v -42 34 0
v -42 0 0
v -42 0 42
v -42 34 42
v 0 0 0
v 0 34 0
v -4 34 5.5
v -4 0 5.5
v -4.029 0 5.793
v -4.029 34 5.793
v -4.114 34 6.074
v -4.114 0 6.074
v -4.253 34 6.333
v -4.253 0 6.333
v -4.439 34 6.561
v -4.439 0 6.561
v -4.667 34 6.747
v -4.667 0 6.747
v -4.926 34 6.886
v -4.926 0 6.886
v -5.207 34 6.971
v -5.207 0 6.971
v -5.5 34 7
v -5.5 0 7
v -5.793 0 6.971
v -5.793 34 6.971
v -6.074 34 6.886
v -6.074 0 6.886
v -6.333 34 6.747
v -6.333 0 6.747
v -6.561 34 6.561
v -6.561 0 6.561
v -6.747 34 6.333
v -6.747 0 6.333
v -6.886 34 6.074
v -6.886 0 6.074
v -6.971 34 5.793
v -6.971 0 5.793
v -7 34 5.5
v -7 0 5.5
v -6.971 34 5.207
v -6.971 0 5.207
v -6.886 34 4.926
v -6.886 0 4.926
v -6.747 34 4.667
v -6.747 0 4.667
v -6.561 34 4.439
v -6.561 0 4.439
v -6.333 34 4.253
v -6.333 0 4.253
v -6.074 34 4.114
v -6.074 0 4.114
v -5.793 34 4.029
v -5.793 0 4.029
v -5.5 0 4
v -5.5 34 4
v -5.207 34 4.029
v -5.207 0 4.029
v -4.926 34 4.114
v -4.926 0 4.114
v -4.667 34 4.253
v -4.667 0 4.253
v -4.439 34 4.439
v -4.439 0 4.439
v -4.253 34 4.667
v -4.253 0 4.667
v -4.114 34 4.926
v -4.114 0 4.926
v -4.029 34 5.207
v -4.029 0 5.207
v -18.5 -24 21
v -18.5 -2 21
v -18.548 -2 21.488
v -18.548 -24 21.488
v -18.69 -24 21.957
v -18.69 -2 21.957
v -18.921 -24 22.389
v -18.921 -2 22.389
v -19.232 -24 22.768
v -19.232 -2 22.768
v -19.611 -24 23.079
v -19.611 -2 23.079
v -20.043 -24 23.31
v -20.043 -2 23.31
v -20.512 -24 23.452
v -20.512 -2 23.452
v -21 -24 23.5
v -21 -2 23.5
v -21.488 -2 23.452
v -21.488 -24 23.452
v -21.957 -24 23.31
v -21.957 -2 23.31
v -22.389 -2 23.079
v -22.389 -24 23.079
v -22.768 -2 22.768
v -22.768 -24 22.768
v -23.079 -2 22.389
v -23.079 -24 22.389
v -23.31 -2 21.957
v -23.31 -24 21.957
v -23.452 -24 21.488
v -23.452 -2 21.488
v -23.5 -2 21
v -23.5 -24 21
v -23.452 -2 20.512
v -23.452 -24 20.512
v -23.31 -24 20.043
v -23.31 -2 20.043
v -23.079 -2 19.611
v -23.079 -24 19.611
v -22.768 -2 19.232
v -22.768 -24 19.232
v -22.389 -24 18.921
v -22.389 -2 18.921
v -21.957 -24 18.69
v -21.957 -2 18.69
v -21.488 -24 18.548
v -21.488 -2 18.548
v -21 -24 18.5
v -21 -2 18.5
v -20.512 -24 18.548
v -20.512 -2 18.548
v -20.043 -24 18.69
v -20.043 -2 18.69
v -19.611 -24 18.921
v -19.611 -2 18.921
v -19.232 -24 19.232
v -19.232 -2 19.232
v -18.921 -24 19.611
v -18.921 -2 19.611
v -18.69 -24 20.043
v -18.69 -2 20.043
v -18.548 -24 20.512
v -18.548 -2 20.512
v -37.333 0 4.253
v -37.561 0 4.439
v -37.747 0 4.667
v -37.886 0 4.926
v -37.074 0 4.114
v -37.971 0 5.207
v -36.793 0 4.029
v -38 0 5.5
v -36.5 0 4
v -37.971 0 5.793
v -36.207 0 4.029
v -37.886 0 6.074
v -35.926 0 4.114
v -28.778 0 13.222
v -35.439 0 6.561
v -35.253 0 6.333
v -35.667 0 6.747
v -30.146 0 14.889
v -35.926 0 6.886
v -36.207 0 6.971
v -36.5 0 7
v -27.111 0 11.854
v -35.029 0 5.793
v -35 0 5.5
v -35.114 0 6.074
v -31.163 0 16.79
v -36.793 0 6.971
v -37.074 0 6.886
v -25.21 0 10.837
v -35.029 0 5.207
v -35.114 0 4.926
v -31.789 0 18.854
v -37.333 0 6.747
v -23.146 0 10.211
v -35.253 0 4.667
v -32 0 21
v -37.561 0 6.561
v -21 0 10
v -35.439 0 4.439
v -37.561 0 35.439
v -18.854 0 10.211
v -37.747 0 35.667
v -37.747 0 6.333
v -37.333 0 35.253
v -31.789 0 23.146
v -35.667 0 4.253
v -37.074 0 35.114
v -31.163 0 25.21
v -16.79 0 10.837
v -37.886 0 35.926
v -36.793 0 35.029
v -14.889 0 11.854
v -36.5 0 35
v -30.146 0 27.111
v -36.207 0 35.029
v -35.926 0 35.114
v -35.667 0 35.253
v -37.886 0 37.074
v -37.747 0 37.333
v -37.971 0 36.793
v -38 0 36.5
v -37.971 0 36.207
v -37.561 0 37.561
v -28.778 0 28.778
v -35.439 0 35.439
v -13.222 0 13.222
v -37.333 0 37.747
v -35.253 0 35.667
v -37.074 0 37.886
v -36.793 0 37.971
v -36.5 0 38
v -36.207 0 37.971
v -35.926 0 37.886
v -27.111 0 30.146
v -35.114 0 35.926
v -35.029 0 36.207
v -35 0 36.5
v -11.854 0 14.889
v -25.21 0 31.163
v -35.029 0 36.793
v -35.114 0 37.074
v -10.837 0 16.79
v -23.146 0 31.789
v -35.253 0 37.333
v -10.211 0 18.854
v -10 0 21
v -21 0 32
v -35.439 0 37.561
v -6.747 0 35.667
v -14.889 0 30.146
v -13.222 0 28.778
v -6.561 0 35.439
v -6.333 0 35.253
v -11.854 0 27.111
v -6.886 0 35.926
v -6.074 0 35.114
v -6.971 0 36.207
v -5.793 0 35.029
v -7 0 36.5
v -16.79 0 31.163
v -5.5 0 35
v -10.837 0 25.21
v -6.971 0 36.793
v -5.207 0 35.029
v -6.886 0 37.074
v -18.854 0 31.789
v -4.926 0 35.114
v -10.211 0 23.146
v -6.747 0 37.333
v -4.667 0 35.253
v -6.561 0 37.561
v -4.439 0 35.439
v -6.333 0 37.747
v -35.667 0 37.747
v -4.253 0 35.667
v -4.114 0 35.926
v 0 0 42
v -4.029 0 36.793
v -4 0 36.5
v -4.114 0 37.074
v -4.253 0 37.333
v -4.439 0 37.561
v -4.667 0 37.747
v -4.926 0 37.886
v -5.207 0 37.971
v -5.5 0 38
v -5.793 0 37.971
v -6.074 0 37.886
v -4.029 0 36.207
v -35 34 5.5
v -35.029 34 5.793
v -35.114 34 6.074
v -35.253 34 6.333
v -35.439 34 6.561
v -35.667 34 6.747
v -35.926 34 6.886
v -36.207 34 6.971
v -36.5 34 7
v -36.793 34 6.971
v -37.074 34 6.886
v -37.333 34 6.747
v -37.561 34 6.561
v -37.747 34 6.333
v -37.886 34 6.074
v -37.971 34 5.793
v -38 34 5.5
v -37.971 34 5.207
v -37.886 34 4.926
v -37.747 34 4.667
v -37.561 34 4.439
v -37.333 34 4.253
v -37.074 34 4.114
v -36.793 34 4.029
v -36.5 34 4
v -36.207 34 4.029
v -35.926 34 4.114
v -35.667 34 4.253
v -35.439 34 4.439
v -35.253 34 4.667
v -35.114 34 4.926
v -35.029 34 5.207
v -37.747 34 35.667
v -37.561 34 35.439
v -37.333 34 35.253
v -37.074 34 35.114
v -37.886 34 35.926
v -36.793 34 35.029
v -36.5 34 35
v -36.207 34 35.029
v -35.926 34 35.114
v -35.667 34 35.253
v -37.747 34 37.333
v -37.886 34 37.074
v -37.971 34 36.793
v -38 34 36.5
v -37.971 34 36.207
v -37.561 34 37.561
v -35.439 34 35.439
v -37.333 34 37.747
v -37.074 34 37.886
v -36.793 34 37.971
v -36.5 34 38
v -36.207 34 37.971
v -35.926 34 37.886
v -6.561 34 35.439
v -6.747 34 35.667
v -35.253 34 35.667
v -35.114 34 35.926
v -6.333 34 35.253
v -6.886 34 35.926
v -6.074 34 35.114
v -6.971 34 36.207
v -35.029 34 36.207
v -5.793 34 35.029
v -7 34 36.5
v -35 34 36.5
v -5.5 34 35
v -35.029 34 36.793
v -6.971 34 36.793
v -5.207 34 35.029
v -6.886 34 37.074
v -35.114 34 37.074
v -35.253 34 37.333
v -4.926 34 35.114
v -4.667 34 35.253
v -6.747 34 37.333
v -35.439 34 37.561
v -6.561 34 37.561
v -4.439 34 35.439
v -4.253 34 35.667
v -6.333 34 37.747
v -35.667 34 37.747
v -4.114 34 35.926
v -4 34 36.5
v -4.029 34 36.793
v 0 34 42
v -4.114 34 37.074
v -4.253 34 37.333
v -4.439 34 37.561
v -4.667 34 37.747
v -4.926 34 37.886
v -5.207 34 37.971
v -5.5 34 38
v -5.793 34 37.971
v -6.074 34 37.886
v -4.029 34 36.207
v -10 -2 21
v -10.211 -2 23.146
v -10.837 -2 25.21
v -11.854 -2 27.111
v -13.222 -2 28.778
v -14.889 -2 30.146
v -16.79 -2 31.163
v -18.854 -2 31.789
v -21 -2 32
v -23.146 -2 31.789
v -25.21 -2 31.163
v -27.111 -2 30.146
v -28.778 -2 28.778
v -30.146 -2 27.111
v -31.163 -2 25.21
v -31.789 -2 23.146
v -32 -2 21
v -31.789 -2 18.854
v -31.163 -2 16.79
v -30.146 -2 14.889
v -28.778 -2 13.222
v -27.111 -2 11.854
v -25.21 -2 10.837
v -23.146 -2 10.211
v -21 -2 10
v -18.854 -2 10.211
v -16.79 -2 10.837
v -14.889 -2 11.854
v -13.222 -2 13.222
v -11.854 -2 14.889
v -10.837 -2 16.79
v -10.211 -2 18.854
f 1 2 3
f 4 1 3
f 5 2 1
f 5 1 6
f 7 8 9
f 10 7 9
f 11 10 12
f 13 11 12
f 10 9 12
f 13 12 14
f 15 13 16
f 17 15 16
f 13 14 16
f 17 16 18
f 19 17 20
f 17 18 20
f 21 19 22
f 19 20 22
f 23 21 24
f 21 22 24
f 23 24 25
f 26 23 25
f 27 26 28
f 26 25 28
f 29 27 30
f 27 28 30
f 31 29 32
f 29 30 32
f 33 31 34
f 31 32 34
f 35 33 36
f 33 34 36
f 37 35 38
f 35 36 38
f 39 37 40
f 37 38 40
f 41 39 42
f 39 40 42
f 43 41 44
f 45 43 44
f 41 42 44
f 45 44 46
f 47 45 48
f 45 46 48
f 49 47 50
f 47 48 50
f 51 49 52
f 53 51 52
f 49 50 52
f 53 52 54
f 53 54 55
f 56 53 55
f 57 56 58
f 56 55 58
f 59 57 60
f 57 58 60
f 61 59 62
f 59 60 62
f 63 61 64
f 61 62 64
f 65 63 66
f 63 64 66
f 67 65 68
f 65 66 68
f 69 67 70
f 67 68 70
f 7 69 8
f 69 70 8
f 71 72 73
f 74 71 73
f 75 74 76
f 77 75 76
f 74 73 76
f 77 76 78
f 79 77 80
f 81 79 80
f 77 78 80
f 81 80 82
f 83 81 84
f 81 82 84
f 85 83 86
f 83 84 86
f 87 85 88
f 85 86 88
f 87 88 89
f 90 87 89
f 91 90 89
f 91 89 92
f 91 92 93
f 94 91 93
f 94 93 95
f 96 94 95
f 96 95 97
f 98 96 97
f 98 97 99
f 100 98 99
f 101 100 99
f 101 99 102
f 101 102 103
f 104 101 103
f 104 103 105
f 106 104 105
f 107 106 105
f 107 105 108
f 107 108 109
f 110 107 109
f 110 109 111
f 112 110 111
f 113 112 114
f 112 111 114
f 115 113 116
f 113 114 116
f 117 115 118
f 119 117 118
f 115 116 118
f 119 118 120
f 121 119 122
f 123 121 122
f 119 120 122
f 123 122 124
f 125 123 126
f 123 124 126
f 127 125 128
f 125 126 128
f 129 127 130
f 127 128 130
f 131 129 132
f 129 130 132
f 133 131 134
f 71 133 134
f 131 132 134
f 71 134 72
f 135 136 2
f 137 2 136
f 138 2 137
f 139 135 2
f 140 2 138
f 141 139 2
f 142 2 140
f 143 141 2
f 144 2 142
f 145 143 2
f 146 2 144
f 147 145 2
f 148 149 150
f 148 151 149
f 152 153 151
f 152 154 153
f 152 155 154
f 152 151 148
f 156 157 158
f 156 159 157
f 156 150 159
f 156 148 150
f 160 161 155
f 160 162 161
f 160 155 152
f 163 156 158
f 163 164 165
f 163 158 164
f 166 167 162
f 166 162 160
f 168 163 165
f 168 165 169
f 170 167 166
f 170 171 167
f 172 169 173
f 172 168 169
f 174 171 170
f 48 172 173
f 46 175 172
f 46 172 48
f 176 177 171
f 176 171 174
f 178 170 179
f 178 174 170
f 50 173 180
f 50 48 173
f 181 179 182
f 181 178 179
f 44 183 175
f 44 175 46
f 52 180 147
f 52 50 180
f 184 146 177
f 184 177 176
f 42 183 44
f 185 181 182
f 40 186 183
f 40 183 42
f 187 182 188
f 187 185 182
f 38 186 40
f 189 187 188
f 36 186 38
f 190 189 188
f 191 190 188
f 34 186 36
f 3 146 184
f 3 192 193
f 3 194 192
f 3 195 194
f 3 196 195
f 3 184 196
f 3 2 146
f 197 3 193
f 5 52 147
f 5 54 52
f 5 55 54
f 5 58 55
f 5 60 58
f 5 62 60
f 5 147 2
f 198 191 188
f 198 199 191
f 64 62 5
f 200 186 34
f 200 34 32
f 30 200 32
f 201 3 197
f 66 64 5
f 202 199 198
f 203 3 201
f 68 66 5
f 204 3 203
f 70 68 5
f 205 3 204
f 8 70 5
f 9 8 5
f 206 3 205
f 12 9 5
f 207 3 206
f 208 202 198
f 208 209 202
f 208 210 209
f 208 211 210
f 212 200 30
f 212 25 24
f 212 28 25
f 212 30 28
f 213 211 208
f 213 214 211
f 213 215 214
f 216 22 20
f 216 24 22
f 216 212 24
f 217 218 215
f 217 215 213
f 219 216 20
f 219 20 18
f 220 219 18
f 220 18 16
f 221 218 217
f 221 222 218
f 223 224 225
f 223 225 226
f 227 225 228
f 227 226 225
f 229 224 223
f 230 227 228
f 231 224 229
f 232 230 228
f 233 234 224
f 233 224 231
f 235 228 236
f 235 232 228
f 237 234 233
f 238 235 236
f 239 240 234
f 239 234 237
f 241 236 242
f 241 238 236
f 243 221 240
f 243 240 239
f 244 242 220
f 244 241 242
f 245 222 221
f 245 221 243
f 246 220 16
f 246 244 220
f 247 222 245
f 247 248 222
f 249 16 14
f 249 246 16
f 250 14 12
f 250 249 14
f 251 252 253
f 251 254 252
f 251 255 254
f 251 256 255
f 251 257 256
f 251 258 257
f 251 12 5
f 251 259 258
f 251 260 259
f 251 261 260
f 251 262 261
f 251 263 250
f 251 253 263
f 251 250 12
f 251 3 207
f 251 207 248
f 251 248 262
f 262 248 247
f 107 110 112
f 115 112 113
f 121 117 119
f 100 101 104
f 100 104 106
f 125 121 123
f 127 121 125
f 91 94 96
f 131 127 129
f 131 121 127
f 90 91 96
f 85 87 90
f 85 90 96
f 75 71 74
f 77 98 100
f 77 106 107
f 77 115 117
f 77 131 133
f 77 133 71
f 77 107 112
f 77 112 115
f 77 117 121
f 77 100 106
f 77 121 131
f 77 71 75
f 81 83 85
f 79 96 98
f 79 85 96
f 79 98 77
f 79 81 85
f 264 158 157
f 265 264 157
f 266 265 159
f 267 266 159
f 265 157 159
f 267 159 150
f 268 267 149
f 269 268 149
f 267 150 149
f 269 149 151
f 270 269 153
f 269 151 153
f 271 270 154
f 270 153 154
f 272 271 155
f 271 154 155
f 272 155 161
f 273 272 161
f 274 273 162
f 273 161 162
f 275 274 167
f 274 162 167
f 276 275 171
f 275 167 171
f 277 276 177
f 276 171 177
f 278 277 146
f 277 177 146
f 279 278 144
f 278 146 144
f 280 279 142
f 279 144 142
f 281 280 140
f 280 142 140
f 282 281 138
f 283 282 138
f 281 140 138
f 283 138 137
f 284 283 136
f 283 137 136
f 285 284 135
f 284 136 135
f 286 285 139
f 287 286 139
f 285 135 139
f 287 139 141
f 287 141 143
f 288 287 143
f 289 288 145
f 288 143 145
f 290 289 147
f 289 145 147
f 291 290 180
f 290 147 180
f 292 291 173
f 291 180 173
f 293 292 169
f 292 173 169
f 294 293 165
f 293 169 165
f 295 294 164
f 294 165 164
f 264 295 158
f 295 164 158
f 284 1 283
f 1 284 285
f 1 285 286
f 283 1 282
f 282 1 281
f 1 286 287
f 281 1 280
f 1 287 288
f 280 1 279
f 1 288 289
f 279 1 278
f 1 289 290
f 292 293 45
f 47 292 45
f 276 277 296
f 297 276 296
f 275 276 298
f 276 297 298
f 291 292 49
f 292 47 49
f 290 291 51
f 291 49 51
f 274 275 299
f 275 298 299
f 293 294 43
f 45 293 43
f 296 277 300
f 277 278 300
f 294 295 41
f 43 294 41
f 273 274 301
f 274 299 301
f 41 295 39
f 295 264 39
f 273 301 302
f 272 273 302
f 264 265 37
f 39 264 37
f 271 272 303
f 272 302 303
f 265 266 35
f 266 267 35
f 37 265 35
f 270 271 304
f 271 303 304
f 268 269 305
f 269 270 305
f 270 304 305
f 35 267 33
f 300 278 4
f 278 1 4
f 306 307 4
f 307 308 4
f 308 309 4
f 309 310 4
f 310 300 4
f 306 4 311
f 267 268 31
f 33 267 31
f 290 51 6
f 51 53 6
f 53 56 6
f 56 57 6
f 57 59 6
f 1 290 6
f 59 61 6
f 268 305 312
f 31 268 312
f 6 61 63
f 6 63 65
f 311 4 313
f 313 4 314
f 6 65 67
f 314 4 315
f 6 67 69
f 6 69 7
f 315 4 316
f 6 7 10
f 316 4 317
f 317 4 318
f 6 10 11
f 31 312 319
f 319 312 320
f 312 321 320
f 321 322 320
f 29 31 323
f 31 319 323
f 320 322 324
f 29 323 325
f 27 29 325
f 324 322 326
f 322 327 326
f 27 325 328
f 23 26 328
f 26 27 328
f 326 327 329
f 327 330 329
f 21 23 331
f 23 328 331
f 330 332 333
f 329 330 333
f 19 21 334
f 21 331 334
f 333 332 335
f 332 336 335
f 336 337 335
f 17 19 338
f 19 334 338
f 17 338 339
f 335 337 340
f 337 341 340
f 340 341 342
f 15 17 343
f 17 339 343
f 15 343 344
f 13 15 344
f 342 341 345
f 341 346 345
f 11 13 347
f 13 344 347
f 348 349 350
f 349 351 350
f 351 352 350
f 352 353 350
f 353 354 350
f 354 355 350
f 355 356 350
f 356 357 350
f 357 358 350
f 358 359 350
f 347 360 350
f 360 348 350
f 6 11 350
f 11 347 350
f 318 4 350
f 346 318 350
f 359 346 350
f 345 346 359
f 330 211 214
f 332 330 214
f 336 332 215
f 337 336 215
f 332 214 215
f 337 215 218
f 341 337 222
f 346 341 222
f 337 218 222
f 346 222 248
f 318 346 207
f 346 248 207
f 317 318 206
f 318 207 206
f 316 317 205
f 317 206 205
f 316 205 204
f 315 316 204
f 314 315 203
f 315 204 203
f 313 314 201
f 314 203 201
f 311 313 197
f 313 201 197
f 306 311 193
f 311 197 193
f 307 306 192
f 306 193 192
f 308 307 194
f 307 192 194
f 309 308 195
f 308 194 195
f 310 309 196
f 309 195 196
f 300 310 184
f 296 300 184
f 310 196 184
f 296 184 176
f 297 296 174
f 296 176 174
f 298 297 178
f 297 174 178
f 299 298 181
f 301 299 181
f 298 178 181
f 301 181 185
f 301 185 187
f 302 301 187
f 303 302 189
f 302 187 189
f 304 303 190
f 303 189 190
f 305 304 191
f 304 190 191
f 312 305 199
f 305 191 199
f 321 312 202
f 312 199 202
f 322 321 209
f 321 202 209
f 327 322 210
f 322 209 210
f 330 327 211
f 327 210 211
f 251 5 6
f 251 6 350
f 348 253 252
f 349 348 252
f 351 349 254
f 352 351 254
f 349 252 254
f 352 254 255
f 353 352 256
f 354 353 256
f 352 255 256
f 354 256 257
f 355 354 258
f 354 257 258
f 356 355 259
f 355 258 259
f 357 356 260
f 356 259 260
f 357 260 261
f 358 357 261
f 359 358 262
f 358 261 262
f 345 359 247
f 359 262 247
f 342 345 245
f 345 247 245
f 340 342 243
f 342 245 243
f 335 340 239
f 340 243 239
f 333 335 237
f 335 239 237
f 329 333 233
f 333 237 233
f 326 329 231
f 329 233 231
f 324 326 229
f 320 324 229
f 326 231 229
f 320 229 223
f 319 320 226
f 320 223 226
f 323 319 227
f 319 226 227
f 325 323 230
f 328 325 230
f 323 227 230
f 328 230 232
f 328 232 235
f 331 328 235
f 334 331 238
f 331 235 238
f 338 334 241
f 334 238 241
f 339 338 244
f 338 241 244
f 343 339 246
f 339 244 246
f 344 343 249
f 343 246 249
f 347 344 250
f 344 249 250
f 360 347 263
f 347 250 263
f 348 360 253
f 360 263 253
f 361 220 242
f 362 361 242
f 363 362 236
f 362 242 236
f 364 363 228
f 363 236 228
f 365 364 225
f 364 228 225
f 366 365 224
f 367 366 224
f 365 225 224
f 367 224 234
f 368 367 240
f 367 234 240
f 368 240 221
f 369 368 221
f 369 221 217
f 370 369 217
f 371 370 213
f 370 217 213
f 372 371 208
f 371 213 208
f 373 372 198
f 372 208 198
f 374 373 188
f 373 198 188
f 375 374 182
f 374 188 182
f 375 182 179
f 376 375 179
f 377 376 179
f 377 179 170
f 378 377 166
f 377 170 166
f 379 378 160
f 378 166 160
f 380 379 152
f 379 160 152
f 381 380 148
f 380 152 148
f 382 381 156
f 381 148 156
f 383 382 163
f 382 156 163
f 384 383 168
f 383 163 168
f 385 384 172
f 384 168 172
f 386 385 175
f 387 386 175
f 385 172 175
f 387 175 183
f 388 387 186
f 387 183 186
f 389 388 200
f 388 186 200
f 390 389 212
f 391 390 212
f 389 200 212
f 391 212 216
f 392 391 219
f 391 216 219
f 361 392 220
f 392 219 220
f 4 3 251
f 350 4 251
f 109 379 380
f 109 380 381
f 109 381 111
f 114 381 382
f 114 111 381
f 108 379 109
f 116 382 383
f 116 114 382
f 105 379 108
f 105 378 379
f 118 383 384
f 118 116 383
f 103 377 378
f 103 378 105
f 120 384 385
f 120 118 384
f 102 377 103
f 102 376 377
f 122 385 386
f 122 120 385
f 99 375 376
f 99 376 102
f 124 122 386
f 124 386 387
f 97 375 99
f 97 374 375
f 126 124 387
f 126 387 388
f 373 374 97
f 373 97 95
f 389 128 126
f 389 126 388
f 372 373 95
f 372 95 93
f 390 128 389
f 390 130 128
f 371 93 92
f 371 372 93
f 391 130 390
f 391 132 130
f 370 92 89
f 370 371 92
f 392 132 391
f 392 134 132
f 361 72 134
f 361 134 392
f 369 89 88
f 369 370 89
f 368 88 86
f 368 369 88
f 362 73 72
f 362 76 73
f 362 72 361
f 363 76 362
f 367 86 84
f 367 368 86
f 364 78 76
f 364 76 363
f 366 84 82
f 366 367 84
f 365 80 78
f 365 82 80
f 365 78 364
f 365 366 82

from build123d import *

# Parameters (mm, degrees)
F0_W     = 42
F0_H     = 42
F0_R     = 1.5
F0_R_2   = 11
F0_R_3   = 2.5
F1_DEPTH = 34
F2_DEPTH = 24
F3_DEPTH = 2


with BuildPart() as f1:
    # F0 (on Front) → F1 (new body)
    with BuildSketch(Plane.XZ):
        with Locations((-21, 21)):
            Rectangle(F0_W, F0_H)
        with Locations((-36.5, 5.5)):
            Circle(F0_R, mode=Mode.SUBTRACT)
        with Locations((-5.5, 5.5)):
            Circle(F0_R, mode=Mode.SUBTRACT)
        with Locations((-36.5, 36.5)):
            Circle(F0_R, mode=Mode.SUBTRACT)
        with Locations((-21, 21)):
            Circle(F0_R_2, mode=Mode.SUBTRACT)
        with Locations((-5.5, 36.5)):
            Circle(F0_R, mode=Mode.SUBTRACT)
        with Locations((-21, 21)):
            Circle(F0_R_2)
        with Locations((-21, 21)):
            Circle(F0_R_3, mode=Mode.SUBTRACT)
        with Locations((-21, 21)):
            Circle(F0_R_3)
    extrude(amount=-F1_DEPTH)

    # F0 (on Front) → F2 (join)
    with BuildSketch(Plane.XZ):
        with Locations((-21, 21)):
            Circle(F0_R_3)
    extrude(amount=F2_DEPTH)

    # F0 (on Front) → F3 (join)
    with BuildSketch(Plane.XZ):
        with Locations((-21, 21)):
            Circle(F0_R_2)
        with Locations((-21, 21)):
            Circle(F0_R_3, mode=Mode.SUBTRACT)
    extrude(amount=F3_DEPTH)


solid = f1.part
